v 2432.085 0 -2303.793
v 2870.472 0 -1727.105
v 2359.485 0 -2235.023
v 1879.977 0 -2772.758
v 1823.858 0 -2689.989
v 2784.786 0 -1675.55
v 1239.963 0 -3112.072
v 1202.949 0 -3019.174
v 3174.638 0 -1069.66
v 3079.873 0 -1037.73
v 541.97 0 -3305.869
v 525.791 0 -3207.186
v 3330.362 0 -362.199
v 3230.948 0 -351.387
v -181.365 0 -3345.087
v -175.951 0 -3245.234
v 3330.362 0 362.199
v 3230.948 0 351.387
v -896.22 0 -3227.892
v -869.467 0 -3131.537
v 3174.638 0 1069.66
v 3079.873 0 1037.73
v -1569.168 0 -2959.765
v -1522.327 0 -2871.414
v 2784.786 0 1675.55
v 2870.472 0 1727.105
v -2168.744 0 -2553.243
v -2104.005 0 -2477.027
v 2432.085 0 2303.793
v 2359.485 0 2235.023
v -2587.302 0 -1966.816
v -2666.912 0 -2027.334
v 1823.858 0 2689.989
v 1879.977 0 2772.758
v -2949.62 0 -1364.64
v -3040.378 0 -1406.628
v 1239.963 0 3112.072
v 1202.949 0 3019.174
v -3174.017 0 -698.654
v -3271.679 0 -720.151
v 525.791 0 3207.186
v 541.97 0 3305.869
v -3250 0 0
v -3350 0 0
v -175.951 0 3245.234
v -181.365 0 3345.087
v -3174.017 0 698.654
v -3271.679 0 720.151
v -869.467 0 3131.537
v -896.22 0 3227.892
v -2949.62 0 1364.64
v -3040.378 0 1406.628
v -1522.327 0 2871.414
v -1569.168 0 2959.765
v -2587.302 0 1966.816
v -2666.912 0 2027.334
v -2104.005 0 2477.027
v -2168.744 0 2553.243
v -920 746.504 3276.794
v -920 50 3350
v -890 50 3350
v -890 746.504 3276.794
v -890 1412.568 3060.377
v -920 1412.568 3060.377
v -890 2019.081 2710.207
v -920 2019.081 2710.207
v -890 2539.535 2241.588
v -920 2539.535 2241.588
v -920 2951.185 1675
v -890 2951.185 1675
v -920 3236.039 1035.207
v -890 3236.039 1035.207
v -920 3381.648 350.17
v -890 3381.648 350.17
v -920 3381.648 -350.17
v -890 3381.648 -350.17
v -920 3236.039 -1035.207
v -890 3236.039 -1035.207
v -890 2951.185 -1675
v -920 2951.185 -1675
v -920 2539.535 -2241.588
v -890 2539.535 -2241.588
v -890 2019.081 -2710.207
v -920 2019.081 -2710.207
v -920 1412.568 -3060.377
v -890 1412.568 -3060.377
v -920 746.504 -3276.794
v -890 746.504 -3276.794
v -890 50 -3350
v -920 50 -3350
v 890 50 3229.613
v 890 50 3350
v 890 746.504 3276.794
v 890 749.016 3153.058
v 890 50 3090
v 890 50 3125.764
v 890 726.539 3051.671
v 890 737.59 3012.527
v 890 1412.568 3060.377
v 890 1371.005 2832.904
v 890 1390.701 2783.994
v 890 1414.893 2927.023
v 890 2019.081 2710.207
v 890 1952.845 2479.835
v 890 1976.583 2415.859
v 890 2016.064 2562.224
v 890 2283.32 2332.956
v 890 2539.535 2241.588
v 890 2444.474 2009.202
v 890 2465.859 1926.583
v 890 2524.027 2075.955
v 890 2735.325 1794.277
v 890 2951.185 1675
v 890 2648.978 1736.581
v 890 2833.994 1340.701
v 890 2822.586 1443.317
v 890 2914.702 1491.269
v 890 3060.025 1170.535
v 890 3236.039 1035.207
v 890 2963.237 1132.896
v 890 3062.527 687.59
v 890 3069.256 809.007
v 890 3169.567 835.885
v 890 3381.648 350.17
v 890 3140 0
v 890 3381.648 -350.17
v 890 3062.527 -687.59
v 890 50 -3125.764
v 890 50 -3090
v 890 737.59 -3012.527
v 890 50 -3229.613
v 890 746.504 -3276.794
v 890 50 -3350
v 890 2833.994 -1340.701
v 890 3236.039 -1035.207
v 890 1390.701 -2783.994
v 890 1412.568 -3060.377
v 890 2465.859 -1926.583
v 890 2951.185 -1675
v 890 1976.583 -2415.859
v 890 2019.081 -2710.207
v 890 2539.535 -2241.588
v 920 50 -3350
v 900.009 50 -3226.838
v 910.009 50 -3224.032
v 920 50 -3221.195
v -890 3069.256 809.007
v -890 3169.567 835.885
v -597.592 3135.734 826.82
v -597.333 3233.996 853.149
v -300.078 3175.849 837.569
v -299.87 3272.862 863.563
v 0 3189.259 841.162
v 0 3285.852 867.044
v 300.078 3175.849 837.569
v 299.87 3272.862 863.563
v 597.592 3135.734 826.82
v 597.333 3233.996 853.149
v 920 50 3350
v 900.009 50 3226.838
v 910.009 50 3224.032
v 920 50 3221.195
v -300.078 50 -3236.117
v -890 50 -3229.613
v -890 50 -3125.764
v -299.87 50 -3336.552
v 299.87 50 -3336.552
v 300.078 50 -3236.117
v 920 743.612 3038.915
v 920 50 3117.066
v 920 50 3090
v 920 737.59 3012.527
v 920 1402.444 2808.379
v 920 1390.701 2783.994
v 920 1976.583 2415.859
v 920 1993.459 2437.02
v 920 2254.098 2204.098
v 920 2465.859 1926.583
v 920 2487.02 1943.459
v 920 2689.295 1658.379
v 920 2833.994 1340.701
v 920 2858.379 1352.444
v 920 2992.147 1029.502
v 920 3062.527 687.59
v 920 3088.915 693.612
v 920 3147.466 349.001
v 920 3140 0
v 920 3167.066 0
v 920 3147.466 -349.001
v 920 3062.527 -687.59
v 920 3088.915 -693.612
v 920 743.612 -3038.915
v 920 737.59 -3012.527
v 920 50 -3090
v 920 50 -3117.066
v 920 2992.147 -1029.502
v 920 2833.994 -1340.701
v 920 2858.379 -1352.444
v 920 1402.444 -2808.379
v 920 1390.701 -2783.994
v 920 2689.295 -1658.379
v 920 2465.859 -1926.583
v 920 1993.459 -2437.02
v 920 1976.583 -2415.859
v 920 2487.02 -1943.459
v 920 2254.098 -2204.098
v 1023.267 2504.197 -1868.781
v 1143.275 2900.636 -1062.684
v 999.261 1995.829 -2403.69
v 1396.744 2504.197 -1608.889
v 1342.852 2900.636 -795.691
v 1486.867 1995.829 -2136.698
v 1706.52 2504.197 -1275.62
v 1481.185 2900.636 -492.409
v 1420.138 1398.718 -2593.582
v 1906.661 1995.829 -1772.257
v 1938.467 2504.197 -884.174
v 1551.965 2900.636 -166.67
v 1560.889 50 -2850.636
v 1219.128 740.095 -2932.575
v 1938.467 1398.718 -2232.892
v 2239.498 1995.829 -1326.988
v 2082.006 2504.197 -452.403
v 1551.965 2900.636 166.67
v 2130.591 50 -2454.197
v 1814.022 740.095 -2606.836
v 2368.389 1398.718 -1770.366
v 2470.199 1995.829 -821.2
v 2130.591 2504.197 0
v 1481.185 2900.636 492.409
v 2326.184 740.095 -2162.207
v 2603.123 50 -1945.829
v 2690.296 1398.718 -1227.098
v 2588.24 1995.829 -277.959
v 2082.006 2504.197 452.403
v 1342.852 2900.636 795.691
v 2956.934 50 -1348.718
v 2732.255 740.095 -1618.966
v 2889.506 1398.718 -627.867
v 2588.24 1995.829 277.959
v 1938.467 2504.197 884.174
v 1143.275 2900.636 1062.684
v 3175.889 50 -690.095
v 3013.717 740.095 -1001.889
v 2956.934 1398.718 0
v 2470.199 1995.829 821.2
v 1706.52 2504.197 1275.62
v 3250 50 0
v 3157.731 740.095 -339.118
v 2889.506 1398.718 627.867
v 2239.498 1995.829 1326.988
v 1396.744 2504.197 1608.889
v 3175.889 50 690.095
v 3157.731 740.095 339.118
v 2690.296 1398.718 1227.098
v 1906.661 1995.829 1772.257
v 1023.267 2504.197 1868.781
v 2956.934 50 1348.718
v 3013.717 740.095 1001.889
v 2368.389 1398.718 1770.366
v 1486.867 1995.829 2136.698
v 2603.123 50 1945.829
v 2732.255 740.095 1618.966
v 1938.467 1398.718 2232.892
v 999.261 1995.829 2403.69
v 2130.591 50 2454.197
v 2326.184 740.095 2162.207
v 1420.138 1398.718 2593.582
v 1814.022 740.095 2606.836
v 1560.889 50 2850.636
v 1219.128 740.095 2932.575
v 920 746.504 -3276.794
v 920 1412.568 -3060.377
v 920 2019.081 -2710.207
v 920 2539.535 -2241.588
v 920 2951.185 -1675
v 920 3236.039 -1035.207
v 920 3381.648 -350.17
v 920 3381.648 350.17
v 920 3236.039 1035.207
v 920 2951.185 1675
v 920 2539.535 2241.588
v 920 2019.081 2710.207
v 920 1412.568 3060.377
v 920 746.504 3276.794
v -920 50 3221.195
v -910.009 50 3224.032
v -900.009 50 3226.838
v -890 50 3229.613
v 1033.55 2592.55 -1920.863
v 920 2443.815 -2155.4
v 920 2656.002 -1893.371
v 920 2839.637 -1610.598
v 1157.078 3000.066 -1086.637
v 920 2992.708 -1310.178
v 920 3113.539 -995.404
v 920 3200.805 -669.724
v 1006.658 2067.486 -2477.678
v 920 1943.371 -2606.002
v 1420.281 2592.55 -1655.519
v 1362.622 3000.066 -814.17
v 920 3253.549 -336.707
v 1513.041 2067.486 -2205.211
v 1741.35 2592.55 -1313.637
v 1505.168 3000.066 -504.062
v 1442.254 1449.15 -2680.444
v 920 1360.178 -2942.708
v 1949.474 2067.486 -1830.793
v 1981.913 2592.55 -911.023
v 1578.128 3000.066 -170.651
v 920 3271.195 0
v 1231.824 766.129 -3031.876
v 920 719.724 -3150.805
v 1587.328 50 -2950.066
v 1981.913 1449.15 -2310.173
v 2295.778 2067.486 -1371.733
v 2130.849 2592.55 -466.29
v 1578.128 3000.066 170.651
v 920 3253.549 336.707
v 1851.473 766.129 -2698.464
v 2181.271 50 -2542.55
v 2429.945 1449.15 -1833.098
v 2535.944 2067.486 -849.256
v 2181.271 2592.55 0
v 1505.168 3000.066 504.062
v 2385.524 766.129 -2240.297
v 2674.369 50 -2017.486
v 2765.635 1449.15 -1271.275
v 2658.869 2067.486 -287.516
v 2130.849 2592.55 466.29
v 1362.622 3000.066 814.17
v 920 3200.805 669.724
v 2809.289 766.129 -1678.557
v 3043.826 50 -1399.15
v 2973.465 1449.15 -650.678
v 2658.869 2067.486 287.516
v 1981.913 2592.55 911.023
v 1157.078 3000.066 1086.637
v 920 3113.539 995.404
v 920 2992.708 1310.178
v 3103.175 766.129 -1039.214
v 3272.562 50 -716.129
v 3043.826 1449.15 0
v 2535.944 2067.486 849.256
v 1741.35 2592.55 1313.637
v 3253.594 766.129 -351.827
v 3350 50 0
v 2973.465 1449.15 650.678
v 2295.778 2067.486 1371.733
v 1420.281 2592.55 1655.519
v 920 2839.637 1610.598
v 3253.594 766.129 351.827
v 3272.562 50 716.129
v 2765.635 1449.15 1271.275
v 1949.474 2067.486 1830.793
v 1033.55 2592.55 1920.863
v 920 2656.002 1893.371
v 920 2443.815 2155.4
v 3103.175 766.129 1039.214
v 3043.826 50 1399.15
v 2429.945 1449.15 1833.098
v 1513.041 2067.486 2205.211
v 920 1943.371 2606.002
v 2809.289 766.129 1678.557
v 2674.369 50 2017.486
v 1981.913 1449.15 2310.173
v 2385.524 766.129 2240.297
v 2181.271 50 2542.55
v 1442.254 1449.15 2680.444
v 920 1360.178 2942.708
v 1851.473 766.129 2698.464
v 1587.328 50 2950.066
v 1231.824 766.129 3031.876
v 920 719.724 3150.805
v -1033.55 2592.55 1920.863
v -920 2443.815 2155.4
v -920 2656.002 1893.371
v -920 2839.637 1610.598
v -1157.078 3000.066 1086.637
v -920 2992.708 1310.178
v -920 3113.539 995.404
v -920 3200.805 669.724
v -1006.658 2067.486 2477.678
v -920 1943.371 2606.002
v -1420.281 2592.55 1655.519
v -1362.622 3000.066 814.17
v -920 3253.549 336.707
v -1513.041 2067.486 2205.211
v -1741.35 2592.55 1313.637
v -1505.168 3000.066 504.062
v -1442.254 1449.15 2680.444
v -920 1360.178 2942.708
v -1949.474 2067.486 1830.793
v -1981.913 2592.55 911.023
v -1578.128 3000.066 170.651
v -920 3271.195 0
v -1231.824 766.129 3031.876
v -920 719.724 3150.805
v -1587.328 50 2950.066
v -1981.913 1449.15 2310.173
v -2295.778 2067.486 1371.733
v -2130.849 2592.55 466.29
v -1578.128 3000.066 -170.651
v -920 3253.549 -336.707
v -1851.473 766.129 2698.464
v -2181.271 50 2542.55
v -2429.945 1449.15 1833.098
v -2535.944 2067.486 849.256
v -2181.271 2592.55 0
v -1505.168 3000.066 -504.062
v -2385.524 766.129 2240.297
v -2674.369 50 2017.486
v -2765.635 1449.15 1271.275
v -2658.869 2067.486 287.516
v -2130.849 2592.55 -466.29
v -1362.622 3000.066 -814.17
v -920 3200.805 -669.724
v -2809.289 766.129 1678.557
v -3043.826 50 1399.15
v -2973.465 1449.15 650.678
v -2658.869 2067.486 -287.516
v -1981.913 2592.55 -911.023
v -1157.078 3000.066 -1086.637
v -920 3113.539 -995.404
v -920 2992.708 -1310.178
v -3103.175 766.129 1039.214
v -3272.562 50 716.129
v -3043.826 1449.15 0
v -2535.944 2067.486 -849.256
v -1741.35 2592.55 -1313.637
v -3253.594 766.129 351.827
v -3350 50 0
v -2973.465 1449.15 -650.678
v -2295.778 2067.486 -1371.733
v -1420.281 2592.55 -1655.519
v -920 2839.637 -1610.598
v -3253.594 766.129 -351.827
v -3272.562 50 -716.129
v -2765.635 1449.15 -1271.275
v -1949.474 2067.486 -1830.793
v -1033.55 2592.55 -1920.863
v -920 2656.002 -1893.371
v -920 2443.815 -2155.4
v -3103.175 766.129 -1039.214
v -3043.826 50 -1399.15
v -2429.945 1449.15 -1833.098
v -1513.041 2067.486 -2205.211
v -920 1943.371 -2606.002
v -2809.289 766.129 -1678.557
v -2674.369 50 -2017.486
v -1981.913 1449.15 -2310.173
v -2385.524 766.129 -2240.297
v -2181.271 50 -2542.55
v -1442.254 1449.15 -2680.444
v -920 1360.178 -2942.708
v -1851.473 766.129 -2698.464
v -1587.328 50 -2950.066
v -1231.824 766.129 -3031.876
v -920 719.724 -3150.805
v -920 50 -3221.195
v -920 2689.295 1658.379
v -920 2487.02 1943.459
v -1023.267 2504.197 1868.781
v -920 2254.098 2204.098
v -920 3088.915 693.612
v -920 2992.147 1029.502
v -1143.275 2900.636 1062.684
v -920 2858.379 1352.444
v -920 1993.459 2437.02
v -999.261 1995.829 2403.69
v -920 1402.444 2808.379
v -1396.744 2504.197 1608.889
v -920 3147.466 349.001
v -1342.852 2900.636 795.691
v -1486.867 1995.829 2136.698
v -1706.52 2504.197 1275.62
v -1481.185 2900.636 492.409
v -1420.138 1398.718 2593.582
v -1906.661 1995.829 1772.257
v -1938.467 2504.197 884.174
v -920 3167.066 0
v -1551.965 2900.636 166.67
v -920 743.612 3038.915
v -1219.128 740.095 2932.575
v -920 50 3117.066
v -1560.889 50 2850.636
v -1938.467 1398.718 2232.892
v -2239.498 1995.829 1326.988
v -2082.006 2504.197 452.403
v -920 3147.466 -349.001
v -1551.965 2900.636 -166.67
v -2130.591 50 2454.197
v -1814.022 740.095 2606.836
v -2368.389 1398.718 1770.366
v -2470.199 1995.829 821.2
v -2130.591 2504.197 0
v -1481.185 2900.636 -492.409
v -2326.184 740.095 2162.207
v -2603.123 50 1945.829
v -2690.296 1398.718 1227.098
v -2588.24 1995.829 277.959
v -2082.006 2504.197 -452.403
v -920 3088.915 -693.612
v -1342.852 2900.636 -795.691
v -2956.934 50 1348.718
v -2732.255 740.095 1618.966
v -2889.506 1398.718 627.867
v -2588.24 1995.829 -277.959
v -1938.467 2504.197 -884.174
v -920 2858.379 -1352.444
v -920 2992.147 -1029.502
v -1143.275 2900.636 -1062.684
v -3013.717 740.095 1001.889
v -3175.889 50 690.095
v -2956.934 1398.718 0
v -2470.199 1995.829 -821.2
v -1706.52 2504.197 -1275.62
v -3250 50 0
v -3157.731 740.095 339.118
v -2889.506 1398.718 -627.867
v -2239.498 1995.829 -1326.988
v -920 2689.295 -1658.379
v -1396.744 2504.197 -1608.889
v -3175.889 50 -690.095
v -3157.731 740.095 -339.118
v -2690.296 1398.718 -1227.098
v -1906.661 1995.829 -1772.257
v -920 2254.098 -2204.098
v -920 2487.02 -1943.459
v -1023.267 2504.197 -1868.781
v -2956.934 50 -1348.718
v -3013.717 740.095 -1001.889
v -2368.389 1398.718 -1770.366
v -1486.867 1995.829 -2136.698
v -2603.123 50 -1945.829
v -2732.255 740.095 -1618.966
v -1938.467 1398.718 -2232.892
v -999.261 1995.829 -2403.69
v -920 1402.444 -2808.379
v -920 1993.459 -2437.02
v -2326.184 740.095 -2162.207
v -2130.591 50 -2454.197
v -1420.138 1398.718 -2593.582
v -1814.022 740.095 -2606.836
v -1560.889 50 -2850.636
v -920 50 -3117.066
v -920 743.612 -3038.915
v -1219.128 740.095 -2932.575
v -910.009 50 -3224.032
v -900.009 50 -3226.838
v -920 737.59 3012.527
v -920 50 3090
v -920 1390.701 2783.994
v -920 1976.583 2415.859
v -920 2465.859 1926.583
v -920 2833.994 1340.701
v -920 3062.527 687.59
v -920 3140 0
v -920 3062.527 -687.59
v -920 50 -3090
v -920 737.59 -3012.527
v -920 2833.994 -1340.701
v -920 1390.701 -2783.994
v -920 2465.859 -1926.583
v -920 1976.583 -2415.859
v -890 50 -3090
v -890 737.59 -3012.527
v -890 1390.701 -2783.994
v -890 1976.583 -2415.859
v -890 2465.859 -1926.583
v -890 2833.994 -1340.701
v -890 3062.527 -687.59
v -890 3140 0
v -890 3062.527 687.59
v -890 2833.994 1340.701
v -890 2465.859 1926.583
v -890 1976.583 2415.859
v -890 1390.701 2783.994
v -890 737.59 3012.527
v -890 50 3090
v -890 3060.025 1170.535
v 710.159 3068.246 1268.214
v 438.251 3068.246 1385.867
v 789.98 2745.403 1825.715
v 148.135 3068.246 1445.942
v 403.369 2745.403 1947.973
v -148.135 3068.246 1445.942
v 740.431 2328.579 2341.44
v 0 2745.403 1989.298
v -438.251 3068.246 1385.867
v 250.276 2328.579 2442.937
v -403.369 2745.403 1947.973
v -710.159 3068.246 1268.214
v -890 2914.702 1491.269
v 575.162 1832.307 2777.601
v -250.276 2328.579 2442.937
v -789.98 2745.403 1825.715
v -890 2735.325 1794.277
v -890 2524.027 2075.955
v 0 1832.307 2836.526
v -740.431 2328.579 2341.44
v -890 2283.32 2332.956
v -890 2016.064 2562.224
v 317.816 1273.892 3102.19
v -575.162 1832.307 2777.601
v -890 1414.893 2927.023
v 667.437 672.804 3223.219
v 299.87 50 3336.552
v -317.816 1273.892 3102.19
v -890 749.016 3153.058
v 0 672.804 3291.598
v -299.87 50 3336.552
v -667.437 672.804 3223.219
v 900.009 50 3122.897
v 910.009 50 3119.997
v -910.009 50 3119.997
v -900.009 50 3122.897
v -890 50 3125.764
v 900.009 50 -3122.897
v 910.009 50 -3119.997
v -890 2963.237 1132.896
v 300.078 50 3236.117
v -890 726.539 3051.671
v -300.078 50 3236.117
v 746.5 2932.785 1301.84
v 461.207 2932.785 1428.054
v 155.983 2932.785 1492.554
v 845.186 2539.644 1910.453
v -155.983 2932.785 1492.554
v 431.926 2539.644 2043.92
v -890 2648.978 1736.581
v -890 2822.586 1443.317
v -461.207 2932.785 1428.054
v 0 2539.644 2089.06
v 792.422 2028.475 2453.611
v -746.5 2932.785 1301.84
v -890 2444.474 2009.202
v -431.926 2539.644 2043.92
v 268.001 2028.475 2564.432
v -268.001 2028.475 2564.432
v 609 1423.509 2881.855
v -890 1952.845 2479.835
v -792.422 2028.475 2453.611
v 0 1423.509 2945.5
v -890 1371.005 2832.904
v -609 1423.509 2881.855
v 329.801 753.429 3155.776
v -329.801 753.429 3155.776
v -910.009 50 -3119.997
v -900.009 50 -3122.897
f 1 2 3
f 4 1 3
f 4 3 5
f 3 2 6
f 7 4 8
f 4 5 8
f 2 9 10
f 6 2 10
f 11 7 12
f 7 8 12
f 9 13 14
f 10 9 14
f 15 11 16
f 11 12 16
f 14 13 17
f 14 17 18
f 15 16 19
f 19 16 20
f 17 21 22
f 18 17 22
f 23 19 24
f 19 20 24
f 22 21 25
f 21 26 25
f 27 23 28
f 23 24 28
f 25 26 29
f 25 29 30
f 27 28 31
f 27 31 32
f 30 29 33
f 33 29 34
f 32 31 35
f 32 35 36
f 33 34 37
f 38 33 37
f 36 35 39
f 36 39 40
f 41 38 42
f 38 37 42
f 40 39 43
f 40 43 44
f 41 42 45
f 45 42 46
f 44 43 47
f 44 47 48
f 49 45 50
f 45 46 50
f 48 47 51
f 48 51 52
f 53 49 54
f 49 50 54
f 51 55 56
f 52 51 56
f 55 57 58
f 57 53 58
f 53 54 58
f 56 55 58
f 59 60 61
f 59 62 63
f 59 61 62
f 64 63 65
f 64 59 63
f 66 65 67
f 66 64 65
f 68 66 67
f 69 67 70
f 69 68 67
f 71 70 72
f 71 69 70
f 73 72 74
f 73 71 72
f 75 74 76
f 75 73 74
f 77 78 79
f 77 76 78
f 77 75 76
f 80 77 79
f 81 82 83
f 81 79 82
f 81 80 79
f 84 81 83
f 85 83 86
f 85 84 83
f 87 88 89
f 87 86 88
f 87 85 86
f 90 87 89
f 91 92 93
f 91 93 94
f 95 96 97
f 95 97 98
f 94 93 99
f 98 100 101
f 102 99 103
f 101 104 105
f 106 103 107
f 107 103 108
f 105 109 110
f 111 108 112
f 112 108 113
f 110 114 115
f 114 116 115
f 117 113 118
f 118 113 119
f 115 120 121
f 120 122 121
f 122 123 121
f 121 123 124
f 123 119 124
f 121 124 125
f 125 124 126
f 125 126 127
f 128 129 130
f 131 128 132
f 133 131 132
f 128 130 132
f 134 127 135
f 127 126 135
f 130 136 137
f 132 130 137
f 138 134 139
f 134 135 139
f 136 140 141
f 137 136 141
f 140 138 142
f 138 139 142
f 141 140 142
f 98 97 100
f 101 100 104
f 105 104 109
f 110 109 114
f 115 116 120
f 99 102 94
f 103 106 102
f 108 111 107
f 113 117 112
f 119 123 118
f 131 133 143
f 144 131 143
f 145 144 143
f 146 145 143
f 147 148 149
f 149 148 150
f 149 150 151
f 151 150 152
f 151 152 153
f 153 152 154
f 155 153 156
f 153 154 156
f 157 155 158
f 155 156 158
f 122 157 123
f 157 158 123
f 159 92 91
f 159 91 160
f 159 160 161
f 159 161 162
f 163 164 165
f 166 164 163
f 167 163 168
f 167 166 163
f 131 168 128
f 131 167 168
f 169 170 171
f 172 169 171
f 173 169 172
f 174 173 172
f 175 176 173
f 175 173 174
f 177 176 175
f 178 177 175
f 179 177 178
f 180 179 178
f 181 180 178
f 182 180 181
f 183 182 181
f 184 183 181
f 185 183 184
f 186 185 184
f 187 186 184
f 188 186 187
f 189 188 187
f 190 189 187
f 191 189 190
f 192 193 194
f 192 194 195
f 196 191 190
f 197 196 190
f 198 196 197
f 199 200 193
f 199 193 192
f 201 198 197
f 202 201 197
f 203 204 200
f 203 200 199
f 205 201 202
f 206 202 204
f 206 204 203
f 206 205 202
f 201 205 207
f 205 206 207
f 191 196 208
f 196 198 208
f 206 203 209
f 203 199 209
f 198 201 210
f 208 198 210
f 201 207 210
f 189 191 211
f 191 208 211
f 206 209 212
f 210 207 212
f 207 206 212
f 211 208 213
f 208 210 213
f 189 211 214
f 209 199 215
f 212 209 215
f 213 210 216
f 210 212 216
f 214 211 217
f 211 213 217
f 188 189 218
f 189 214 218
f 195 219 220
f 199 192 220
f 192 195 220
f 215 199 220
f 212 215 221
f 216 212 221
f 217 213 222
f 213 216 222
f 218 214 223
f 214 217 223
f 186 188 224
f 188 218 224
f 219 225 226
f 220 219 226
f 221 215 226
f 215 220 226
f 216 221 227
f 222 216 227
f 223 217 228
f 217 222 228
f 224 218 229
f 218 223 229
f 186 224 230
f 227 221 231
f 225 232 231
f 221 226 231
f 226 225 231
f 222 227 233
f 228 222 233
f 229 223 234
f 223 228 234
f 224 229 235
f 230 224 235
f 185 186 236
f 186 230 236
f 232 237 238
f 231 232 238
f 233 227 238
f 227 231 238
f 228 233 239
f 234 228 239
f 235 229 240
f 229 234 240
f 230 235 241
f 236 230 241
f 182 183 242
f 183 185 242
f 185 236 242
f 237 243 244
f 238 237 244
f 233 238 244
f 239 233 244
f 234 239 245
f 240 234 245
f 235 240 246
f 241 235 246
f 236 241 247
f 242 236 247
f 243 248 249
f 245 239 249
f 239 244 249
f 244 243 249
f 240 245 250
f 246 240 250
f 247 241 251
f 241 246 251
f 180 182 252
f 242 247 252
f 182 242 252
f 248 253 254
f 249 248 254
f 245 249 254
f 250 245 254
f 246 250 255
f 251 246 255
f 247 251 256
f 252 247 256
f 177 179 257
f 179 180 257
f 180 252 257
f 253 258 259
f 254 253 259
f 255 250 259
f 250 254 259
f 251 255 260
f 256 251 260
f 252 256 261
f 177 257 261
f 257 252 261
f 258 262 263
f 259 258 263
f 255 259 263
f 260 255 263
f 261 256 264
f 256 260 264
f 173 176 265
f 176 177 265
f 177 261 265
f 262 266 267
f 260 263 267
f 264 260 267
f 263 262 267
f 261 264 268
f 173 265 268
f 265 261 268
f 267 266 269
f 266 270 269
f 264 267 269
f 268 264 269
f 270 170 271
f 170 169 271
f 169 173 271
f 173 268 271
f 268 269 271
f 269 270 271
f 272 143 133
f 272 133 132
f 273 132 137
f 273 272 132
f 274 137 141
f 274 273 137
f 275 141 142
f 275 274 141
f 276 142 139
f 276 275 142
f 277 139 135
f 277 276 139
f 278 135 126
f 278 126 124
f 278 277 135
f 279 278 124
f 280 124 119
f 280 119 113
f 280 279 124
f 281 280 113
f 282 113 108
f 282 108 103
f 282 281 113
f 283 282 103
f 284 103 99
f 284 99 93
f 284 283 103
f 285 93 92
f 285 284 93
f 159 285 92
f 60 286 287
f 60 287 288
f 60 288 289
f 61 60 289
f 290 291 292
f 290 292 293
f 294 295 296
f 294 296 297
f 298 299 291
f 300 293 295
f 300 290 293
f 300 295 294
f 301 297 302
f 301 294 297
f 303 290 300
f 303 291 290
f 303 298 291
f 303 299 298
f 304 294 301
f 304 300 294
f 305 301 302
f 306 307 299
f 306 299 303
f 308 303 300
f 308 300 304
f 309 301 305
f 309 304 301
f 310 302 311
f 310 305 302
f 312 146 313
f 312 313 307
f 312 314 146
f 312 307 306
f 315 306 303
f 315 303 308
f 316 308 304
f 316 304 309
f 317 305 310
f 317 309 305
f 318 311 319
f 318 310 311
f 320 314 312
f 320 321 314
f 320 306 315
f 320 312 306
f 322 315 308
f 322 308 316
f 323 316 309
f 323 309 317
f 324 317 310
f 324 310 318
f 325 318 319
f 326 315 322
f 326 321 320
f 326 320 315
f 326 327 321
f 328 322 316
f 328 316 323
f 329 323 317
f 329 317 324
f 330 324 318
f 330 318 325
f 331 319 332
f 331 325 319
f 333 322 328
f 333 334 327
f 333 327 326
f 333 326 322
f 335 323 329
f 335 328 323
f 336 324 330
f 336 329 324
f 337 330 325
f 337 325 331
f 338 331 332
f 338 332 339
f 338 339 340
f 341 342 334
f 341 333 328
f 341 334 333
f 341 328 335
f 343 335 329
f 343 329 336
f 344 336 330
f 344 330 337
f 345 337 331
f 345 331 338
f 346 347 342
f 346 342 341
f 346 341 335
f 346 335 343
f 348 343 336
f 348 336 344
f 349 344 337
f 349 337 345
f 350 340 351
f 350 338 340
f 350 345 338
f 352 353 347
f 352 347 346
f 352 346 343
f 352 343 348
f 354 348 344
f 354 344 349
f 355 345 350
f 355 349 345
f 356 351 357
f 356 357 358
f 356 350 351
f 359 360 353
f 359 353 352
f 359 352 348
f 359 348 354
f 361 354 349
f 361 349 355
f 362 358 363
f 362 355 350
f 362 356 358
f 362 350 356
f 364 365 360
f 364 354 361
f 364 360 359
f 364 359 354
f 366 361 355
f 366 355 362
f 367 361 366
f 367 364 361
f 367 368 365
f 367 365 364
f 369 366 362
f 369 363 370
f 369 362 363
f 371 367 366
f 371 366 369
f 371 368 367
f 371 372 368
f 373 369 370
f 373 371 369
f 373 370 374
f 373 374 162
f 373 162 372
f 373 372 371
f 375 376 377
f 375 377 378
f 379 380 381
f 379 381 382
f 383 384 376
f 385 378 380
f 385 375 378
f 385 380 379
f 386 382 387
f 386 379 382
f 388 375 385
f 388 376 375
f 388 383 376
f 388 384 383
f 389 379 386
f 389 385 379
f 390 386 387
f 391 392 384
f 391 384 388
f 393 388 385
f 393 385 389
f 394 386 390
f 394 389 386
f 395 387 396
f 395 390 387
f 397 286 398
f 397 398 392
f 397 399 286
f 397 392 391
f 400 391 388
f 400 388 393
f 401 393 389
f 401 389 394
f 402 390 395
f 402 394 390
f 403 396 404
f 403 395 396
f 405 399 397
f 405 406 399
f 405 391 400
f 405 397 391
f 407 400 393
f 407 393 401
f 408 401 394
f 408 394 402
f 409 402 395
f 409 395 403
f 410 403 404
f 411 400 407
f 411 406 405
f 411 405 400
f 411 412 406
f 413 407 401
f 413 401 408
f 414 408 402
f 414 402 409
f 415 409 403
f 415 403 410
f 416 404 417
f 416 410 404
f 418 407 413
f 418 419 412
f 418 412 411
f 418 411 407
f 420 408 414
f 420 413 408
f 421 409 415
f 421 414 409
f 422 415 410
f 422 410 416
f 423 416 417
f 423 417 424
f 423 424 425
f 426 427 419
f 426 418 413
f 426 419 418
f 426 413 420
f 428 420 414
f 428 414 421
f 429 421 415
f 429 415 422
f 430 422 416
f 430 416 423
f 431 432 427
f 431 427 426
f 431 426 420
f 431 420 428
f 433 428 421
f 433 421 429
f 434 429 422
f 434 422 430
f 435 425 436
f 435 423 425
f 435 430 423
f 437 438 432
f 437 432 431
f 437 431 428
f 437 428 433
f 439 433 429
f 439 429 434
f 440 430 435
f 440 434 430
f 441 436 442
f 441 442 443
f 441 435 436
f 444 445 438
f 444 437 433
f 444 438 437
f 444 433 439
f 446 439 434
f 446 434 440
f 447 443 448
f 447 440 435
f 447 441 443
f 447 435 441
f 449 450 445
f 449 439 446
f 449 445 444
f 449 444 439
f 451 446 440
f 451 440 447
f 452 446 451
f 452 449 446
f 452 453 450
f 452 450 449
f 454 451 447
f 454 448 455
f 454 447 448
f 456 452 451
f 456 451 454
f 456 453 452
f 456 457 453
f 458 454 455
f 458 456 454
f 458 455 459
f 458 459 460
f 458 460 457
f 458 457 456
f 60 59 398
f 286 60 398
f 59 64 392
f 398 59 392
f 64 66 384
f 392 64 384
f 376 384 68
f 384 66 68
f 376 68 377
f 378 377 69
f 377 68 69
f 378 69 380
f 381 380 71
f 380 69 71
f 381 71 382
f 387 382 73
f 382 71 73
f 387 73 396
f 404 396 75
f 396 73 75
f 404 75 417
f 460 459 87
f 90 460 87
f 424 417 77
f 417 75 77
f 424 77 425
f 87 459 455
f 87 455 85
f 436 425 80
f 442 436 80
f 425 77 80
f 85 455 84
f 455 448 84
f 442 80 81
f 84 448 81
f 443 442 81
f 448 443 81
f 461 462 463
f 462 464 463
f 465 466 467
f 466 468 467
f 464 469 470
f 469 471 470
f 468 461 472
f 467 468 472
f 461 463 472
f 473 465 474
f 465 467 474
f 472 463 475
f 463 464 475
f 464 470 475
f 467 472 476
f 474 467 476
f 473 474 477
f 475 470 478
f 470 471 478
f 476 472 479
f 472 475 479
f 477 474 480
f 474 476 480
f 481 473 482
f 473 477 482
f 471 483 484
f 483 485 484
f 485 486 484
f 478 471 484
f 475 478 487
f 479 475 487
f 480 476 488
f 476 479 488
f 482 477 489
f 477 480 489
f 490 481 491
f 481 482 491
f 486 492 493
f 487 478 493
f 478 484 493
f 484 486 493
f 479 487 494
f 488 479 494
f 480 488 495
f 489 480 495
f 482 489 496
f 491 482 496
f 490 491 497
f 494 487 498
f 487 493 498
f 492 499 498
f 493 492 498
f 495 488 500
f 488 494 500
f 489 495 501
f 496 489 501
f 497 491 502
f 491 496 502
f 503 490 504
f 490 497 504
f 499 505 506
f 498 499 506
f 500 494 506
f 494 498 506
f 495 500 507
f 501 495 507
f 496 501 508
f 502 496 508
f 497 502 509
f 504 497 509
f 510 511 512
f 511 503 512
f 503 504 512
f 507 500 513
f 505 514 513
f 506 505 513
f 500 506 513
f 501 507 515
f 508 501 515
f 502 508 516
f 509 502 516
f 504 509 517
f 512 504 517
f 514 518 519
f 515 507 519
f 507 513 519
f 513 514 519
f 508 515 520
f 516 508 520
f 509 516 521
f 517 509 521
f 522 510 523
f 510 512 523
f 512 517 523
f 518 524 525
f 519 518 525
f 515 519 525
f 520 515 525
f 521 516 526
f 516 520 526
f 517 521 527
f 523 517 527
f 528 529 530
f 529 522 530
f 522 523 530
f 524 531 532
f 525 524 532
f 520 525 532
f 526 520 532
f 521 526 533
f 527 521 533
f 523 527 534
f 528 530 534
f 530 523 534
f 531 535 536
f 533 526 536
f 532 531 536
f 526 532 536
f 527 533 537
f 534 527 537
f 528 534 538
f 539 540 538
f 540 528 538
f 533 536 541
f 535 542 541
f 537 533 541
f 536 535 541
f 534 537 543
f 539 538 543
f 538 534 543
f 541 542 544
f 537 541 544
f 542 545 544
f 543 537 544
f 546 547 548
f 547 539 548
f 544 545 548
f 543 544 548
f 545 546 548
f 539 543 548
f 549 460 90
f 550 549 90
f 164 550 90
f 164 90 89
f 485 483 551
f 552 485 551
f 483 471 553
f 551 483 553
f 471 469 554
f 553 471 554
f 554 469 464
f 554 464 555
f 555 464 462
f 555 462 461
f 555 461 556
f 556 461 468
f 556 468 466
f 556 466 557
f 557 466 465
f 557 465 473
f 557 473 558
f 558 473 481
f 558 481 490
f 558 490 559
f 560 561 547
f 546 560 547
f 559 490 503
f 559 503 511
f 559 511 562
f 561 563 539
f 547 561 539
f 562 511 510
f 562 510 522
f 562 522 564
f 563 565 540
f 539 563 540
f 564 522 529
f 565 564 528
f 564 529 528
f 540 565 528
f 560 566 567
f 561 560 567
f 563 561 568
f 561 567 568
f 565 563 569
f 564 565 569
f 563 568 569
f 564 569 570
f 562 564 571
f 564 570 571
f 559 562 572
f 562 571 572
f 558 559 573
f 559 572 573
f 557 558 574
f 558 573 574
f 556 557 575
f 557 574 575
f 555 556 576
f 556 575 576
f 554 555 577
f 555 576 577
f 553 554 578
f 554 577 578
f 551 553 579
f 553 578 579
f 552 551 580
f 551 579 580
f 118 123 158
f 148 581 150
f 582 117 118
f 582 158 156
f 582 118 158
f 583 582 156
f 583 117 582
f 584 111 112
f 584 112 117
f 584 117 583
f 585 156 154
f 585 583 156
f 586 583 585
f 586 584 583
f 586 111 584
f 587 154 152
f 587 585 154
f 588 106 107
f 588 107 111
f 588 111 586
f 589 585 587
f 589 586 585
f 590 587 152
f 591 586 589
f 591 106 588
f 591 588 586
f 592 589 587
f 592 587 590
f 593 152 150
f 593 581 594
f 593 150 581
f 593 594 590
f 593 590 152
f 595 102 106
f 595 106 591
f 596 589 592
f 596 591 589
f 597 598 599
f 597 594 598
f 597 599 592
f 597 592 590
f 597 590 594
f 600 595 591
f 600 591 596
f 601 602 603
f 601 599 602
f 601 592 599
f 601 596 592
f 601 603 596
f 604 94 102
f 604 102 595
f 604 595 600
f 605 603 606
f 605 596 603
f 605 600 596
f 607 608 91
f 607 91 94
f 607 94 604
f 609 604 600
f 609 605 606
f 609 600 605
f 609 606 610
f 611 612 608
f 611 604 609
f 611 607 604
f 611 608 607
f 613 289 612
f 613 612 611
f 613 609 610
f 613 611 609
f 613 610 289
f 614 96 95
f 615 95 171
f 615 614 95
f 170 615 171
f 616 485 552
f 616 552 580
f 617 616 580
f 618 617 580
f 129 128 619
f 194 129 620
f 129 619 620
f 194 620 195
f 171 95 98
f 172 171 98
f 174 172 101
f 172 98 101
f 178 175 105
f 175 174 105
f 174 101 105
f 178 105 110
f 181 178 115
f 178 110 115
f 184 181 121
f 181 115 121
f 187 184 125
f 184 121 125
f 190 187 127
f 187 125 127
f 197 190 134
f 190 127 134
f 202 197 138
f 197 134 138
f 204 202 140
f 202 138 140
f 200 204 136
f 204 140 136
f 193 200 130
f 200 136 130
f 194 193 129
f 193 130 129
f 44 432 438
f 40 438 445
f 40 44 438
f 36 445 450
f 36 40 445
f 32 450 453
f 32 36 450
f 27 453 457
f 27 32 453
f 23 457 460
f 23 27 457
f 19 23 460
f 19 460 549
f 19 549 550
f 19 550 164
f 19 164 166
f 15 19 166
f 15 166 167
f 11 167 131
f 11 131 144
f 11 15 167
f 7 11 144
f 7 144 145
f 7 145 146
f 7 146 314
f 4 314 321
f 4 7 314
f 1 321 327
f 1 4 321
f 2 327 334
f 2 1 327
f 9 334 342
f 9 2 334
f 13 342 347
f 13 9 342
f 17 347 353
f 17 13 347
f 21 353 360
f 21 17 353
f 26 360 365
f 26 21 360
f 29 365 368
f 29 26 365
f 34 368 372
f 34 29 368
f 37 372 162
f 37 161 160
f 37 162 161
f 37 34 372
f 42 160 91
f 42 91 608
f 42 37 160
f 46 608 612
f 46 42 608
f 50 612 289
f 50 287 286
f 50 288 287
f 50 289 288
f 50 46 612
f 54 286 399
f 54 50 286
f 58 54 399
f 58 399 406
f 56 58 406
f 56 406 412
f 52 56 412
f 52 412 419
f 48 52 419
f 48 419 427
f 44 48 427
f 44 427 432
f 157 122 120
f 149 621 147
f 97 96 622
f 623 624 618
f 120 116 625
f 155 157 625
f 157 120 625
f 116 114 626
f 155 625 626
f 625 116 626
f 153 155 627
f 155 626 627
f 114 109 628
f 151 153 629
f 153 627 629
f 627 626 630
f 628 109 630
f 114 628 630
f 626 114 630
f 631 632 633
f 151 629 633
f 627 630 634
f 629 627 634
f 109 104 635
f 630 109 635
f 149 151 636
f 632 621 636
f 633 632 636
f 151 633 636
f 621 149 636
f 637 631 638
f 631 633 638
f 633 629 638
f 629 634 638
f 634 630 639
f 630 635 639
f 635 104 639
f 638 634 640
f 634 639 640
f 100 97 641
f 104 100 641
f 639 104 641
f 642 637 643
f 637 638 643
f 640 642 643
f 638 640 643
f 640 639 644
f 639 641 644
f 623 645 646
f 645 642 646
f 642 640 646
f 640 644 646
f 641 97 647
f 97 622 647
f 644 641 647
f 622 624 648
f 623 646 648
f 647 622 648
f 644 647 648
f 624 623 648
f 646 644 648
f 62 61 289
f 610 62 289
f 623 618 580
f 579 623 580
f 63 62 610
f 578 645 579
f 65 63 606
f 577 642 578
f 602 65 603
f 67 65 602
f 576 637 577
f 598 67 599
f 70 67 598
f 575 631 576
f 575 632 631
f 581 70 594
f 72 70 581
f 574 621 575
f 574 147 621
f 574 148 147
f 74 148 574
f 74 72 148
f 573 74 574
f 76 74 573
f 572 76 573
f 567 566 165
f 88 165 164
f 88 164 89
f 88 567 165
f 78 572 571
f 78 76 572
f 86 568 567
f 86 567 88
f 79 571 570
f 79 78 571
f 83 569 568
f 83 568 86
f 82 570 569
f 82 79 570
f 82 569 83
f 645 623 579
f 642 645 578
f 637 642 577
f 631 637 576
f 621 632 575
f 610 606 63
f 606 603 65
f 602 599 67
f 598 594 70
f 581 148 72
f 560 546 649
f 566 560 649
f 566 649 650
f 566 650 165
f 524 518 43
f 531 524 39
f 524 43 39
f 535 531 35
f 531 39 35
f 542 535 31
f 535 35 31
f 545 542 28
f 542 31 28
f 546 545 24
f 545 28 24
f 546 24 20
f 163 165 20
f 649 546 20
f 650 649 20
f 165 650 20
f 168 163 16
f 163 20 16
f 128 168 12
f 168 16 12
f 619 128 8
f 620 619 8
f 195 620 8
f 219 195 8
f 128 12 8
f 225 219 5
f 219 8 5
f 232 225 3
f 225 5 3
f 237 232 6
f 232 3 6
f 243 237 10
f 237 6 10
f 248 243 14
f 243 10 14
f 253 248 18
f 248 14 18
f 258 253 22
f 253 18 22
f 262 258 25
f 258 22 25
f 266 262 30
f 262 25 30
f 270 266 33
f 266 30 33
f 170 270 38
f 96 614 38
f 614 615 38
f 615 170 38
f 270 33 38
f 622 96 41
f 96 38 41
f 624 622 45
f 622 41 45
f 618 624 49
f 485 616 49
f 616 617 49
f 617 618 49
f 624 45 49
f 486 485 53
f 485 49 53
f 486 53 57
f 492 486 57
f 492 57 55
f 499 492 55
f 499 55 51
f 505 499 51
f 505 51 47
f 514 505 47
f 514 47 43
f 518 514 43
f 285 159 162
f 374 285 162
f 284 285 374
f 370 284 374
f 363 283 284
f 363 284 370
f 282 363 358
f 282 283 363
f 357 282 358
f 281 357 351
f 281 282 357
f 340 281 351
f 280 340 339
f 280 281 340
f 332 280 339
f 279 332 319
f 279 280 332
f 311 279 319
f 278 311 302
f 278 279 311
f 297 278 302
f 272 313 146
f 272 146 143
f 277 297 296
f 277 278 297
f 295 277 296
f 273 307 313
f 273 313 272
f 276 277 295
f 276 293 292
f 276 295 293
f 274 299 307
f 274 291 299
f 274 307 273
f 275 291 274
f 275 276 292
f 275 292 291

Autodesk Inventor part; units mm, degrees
ref_plane "YZ Plane" through (0, 0, 0) normal (1, 0, 0) x (0, 1, 0)
sketch "Sketch1" plane through (0, 0, 0) normal (0, 1, 0) x (-1, 0, 0)
  circle A0 centre (0, 0) radius 3250
  circle A1 centre (0, 0) radius 3350
  dimension "d0" = 6500
  dimension "d1" = 6700
extrude "Extrusion1" add sketch "Sketch1" along normal blind 50
sketch "Sketch2" plane through (0, 50, 0) normal (0, 1, 0) x (1, 0, 0)
  line L0 (0, -3350) -> (-920, -3350)
  line L1 (0, -3350) -> (920, -3350)
  line L2 (920, -3350) -> (920, -3221.1954)
  line L3 (-920, -3221.1954) -> (-920, -3350)
  line L4 (920, -3221.1954) -> (-920, -3221.1954)
  line L5 (0, 3350) -> (-920, 3350)
  line L6 (0, 3350) -> (920, 3350)
  line L7 (920, 3350) -> (920, 3221.1954)
  line L8 (-920, 3221.1954) -> (-920, 3350)
  line L9 (920, 3221.1954) -> (-920, 3221.1954)
  line L10 (920, 3221.1954) -> (920, -3221.1954)
  line L11 (-920, -3221.1954) -> (-920, 3221.1954)
  line L12 (3350, 0) -> (-3350, 0)
  line L13 (0, 3350) -> (0, -3350)
  line L14 (-920, 3117.0659) -> (920, 3117.0659)
  line L15 (-900, 3100) -> (-900, 3242)
  line L16 (-920, 3242) -> (-920, 3100)
  line L17 (900, 3100) -> (900, 3242)
  line L18 (920, 3242) -> (920, 3100)
  line L19 (-920, 3242) -> (-920, 3246)
  line L20 (-920, 3246) -> (-900, 3246)
  line L21 (-900, 3246) -> (-900, 3242)
  line L22 (-920, 3100) -> (-920, 3098)
  line L23 (920, 3100) -> (920, 3096)
  line L24 (920, 3096) -> (900, 3096)
  line L25 (900, 3096) -> (900, 3100)
  line L26 (900, 3242) -> (900, 3246)
  line L27 (900, 3246) -> (920, 3246)
  line L28 (920, 3246) -> (920, 3242)
  line L29 (-920, 3100) -> (-920, 3096)
  line L30 (-920, 3096) -> (-900, 3096)
  line L31 (-900, 3096) -> (-900, 3100)
  line L32 (-920, 3246) -> (-900, 3246)
  line L33 (-900, 3246) -> (-900, 3096)
  line L34 (-900, 3096) -> (-920, 3096)
  line L35 (-920, 3096) -> (-920, 3246)
  line L36 (900, 3246) -> (920, 3246)
  line L37 (920, 3246) -> (920, 3096)
  line L38 (920, 3096) -> (900, 3096)
  line L39 (900, 3096) -> (900, 3246)
  line L40 (-920, 3090) -> (-890, 3090)
  line L41 (-890, 3090) -> (-890, 3350)
  line L42 (-890, 3350) -> (-920, 3350)
  line L43 (-920, 3350) -> (-920, 3090)
  line L44 (920, 3090) -> (890, 3090)
  line L45 (890, 3090) -> (890, 3350)
  line L46 (890, 3350) -> (920, 3350)
  line L47 (920, 3350) -> (920, 3090)
  point P0 (0, 0)
  point P1 (0, 0)
  point P2 (-920, 0)
  point P3 (920, 0)
  point P4 (0, 0)
  point P5 (920, 0)
  point P6 (-920, 0)
ref_plane "Work Plane1" through (0, 50, -3350) normal (-1, 0, 0) x (0, 0, 1)
sketch3d "DomeSketch"
ref_plane "Work Plane2" through (0, 50, 0) normal (0, 1, 0) x (1, 0, 0)
sketch "Sketch3" plane through (0, 50, 0) normal (0, 1, 0) x (1, 0, 0)
  circle A0 centre (0, 0) radius 3350 projected
  line L0 (0, 3350) -> (0, -3350)
sketch3d "3D Sketch2"
sketch "Sketch4" plane through (0, 50, -3350) normal (-1, 0, 0) x (0, 0, 1)
  arc A0 (3350, 3350) -> (0, 0) centre (3350, 0) ccw
  arc A1 (3350, 3250) -> (100, 0) centre (3350, 0) ccw
  line L0 (3350, 3350) -> (3350, 3250)
  line L1 (0, 0) -> (100, 0)
  line L2 (6700, -50) -> (0, -50) projected
  line L3 (3350, 3250) -> (3350, 0)
  line L4 (3350, 0) -> (100, 0)
  point P0 (3350, -50)
revolve "Revolution1" add sketch "Sketch4" angle 360 about axis through (0, 3400, 0) along (0, -1, 0) contours L0 A1 L1 A0
sketch3d "3D Sketch3"
revolve "Revolution2" cut sketch "Sketch2" angle 105 about axis through (3350, 50, 0) along (1, 0, 0) contours L14 L41 L9 L13 | L13 L9 L45 L14 | L13 L6 L45 L9 | L9 L41 L5 L13 | L14 L15 L9 L41 | L45 L9 L17 L14 | L45 L6 L7 L27 L26 L17 L9 | L9 L15 L21 L20 L8 L5 L41 | L14 L11 L9 L15 | L17 L9 L10 L14 | L17 L26 L27 L7 L9 | L9 L8 L20 L21 L15
sketch "Sketch5" plane through (0, 50, 0) normal (0, 0.2588, -0.9659) x (-1, 0, 0)
  arc A0 (920, 3221.1954) -> (-920, 3221.1954) centre (0, 0) ccw projected
  arc A1 (920, 3117.0659) -> (-920, 3117.0659) centre (0, 0) ccw projected
  line L0 (-920, 3221.1954) -> (-920, 3117.0659)
  line L1 (920, -833.7067) -> (920, 3221.1954) projected
  line L2 (920, 3221.1954) -> (920, 3117.0659)
  point P0 (0, -48.2963)
revolve "Revolution3" add sketch "Sketch2" angle 180 about axis through (3350, 50, 0) along (1, 0, 0) contours L11 L30 L31 L15 L14 L41 L40 | L44 L45 L14 L17 L25 L24 L10 | L14 L15 L9 L41 | L45 L9 L17 L14 | L11 L14 L15 L31 L30 | L24 L25 L17 L14 L10 | L45 L6 L7 L27 L26 L17 L9 | L9 L15 L21 L20 L8 L5 L41 | L14 L11 L9 L15 | L17 L9 L10 L14 | L17 L26 L27 L7 L9 | L9 L8 L20 L21 L15
properties part number "DomeHemisphereOldMeasurements"
